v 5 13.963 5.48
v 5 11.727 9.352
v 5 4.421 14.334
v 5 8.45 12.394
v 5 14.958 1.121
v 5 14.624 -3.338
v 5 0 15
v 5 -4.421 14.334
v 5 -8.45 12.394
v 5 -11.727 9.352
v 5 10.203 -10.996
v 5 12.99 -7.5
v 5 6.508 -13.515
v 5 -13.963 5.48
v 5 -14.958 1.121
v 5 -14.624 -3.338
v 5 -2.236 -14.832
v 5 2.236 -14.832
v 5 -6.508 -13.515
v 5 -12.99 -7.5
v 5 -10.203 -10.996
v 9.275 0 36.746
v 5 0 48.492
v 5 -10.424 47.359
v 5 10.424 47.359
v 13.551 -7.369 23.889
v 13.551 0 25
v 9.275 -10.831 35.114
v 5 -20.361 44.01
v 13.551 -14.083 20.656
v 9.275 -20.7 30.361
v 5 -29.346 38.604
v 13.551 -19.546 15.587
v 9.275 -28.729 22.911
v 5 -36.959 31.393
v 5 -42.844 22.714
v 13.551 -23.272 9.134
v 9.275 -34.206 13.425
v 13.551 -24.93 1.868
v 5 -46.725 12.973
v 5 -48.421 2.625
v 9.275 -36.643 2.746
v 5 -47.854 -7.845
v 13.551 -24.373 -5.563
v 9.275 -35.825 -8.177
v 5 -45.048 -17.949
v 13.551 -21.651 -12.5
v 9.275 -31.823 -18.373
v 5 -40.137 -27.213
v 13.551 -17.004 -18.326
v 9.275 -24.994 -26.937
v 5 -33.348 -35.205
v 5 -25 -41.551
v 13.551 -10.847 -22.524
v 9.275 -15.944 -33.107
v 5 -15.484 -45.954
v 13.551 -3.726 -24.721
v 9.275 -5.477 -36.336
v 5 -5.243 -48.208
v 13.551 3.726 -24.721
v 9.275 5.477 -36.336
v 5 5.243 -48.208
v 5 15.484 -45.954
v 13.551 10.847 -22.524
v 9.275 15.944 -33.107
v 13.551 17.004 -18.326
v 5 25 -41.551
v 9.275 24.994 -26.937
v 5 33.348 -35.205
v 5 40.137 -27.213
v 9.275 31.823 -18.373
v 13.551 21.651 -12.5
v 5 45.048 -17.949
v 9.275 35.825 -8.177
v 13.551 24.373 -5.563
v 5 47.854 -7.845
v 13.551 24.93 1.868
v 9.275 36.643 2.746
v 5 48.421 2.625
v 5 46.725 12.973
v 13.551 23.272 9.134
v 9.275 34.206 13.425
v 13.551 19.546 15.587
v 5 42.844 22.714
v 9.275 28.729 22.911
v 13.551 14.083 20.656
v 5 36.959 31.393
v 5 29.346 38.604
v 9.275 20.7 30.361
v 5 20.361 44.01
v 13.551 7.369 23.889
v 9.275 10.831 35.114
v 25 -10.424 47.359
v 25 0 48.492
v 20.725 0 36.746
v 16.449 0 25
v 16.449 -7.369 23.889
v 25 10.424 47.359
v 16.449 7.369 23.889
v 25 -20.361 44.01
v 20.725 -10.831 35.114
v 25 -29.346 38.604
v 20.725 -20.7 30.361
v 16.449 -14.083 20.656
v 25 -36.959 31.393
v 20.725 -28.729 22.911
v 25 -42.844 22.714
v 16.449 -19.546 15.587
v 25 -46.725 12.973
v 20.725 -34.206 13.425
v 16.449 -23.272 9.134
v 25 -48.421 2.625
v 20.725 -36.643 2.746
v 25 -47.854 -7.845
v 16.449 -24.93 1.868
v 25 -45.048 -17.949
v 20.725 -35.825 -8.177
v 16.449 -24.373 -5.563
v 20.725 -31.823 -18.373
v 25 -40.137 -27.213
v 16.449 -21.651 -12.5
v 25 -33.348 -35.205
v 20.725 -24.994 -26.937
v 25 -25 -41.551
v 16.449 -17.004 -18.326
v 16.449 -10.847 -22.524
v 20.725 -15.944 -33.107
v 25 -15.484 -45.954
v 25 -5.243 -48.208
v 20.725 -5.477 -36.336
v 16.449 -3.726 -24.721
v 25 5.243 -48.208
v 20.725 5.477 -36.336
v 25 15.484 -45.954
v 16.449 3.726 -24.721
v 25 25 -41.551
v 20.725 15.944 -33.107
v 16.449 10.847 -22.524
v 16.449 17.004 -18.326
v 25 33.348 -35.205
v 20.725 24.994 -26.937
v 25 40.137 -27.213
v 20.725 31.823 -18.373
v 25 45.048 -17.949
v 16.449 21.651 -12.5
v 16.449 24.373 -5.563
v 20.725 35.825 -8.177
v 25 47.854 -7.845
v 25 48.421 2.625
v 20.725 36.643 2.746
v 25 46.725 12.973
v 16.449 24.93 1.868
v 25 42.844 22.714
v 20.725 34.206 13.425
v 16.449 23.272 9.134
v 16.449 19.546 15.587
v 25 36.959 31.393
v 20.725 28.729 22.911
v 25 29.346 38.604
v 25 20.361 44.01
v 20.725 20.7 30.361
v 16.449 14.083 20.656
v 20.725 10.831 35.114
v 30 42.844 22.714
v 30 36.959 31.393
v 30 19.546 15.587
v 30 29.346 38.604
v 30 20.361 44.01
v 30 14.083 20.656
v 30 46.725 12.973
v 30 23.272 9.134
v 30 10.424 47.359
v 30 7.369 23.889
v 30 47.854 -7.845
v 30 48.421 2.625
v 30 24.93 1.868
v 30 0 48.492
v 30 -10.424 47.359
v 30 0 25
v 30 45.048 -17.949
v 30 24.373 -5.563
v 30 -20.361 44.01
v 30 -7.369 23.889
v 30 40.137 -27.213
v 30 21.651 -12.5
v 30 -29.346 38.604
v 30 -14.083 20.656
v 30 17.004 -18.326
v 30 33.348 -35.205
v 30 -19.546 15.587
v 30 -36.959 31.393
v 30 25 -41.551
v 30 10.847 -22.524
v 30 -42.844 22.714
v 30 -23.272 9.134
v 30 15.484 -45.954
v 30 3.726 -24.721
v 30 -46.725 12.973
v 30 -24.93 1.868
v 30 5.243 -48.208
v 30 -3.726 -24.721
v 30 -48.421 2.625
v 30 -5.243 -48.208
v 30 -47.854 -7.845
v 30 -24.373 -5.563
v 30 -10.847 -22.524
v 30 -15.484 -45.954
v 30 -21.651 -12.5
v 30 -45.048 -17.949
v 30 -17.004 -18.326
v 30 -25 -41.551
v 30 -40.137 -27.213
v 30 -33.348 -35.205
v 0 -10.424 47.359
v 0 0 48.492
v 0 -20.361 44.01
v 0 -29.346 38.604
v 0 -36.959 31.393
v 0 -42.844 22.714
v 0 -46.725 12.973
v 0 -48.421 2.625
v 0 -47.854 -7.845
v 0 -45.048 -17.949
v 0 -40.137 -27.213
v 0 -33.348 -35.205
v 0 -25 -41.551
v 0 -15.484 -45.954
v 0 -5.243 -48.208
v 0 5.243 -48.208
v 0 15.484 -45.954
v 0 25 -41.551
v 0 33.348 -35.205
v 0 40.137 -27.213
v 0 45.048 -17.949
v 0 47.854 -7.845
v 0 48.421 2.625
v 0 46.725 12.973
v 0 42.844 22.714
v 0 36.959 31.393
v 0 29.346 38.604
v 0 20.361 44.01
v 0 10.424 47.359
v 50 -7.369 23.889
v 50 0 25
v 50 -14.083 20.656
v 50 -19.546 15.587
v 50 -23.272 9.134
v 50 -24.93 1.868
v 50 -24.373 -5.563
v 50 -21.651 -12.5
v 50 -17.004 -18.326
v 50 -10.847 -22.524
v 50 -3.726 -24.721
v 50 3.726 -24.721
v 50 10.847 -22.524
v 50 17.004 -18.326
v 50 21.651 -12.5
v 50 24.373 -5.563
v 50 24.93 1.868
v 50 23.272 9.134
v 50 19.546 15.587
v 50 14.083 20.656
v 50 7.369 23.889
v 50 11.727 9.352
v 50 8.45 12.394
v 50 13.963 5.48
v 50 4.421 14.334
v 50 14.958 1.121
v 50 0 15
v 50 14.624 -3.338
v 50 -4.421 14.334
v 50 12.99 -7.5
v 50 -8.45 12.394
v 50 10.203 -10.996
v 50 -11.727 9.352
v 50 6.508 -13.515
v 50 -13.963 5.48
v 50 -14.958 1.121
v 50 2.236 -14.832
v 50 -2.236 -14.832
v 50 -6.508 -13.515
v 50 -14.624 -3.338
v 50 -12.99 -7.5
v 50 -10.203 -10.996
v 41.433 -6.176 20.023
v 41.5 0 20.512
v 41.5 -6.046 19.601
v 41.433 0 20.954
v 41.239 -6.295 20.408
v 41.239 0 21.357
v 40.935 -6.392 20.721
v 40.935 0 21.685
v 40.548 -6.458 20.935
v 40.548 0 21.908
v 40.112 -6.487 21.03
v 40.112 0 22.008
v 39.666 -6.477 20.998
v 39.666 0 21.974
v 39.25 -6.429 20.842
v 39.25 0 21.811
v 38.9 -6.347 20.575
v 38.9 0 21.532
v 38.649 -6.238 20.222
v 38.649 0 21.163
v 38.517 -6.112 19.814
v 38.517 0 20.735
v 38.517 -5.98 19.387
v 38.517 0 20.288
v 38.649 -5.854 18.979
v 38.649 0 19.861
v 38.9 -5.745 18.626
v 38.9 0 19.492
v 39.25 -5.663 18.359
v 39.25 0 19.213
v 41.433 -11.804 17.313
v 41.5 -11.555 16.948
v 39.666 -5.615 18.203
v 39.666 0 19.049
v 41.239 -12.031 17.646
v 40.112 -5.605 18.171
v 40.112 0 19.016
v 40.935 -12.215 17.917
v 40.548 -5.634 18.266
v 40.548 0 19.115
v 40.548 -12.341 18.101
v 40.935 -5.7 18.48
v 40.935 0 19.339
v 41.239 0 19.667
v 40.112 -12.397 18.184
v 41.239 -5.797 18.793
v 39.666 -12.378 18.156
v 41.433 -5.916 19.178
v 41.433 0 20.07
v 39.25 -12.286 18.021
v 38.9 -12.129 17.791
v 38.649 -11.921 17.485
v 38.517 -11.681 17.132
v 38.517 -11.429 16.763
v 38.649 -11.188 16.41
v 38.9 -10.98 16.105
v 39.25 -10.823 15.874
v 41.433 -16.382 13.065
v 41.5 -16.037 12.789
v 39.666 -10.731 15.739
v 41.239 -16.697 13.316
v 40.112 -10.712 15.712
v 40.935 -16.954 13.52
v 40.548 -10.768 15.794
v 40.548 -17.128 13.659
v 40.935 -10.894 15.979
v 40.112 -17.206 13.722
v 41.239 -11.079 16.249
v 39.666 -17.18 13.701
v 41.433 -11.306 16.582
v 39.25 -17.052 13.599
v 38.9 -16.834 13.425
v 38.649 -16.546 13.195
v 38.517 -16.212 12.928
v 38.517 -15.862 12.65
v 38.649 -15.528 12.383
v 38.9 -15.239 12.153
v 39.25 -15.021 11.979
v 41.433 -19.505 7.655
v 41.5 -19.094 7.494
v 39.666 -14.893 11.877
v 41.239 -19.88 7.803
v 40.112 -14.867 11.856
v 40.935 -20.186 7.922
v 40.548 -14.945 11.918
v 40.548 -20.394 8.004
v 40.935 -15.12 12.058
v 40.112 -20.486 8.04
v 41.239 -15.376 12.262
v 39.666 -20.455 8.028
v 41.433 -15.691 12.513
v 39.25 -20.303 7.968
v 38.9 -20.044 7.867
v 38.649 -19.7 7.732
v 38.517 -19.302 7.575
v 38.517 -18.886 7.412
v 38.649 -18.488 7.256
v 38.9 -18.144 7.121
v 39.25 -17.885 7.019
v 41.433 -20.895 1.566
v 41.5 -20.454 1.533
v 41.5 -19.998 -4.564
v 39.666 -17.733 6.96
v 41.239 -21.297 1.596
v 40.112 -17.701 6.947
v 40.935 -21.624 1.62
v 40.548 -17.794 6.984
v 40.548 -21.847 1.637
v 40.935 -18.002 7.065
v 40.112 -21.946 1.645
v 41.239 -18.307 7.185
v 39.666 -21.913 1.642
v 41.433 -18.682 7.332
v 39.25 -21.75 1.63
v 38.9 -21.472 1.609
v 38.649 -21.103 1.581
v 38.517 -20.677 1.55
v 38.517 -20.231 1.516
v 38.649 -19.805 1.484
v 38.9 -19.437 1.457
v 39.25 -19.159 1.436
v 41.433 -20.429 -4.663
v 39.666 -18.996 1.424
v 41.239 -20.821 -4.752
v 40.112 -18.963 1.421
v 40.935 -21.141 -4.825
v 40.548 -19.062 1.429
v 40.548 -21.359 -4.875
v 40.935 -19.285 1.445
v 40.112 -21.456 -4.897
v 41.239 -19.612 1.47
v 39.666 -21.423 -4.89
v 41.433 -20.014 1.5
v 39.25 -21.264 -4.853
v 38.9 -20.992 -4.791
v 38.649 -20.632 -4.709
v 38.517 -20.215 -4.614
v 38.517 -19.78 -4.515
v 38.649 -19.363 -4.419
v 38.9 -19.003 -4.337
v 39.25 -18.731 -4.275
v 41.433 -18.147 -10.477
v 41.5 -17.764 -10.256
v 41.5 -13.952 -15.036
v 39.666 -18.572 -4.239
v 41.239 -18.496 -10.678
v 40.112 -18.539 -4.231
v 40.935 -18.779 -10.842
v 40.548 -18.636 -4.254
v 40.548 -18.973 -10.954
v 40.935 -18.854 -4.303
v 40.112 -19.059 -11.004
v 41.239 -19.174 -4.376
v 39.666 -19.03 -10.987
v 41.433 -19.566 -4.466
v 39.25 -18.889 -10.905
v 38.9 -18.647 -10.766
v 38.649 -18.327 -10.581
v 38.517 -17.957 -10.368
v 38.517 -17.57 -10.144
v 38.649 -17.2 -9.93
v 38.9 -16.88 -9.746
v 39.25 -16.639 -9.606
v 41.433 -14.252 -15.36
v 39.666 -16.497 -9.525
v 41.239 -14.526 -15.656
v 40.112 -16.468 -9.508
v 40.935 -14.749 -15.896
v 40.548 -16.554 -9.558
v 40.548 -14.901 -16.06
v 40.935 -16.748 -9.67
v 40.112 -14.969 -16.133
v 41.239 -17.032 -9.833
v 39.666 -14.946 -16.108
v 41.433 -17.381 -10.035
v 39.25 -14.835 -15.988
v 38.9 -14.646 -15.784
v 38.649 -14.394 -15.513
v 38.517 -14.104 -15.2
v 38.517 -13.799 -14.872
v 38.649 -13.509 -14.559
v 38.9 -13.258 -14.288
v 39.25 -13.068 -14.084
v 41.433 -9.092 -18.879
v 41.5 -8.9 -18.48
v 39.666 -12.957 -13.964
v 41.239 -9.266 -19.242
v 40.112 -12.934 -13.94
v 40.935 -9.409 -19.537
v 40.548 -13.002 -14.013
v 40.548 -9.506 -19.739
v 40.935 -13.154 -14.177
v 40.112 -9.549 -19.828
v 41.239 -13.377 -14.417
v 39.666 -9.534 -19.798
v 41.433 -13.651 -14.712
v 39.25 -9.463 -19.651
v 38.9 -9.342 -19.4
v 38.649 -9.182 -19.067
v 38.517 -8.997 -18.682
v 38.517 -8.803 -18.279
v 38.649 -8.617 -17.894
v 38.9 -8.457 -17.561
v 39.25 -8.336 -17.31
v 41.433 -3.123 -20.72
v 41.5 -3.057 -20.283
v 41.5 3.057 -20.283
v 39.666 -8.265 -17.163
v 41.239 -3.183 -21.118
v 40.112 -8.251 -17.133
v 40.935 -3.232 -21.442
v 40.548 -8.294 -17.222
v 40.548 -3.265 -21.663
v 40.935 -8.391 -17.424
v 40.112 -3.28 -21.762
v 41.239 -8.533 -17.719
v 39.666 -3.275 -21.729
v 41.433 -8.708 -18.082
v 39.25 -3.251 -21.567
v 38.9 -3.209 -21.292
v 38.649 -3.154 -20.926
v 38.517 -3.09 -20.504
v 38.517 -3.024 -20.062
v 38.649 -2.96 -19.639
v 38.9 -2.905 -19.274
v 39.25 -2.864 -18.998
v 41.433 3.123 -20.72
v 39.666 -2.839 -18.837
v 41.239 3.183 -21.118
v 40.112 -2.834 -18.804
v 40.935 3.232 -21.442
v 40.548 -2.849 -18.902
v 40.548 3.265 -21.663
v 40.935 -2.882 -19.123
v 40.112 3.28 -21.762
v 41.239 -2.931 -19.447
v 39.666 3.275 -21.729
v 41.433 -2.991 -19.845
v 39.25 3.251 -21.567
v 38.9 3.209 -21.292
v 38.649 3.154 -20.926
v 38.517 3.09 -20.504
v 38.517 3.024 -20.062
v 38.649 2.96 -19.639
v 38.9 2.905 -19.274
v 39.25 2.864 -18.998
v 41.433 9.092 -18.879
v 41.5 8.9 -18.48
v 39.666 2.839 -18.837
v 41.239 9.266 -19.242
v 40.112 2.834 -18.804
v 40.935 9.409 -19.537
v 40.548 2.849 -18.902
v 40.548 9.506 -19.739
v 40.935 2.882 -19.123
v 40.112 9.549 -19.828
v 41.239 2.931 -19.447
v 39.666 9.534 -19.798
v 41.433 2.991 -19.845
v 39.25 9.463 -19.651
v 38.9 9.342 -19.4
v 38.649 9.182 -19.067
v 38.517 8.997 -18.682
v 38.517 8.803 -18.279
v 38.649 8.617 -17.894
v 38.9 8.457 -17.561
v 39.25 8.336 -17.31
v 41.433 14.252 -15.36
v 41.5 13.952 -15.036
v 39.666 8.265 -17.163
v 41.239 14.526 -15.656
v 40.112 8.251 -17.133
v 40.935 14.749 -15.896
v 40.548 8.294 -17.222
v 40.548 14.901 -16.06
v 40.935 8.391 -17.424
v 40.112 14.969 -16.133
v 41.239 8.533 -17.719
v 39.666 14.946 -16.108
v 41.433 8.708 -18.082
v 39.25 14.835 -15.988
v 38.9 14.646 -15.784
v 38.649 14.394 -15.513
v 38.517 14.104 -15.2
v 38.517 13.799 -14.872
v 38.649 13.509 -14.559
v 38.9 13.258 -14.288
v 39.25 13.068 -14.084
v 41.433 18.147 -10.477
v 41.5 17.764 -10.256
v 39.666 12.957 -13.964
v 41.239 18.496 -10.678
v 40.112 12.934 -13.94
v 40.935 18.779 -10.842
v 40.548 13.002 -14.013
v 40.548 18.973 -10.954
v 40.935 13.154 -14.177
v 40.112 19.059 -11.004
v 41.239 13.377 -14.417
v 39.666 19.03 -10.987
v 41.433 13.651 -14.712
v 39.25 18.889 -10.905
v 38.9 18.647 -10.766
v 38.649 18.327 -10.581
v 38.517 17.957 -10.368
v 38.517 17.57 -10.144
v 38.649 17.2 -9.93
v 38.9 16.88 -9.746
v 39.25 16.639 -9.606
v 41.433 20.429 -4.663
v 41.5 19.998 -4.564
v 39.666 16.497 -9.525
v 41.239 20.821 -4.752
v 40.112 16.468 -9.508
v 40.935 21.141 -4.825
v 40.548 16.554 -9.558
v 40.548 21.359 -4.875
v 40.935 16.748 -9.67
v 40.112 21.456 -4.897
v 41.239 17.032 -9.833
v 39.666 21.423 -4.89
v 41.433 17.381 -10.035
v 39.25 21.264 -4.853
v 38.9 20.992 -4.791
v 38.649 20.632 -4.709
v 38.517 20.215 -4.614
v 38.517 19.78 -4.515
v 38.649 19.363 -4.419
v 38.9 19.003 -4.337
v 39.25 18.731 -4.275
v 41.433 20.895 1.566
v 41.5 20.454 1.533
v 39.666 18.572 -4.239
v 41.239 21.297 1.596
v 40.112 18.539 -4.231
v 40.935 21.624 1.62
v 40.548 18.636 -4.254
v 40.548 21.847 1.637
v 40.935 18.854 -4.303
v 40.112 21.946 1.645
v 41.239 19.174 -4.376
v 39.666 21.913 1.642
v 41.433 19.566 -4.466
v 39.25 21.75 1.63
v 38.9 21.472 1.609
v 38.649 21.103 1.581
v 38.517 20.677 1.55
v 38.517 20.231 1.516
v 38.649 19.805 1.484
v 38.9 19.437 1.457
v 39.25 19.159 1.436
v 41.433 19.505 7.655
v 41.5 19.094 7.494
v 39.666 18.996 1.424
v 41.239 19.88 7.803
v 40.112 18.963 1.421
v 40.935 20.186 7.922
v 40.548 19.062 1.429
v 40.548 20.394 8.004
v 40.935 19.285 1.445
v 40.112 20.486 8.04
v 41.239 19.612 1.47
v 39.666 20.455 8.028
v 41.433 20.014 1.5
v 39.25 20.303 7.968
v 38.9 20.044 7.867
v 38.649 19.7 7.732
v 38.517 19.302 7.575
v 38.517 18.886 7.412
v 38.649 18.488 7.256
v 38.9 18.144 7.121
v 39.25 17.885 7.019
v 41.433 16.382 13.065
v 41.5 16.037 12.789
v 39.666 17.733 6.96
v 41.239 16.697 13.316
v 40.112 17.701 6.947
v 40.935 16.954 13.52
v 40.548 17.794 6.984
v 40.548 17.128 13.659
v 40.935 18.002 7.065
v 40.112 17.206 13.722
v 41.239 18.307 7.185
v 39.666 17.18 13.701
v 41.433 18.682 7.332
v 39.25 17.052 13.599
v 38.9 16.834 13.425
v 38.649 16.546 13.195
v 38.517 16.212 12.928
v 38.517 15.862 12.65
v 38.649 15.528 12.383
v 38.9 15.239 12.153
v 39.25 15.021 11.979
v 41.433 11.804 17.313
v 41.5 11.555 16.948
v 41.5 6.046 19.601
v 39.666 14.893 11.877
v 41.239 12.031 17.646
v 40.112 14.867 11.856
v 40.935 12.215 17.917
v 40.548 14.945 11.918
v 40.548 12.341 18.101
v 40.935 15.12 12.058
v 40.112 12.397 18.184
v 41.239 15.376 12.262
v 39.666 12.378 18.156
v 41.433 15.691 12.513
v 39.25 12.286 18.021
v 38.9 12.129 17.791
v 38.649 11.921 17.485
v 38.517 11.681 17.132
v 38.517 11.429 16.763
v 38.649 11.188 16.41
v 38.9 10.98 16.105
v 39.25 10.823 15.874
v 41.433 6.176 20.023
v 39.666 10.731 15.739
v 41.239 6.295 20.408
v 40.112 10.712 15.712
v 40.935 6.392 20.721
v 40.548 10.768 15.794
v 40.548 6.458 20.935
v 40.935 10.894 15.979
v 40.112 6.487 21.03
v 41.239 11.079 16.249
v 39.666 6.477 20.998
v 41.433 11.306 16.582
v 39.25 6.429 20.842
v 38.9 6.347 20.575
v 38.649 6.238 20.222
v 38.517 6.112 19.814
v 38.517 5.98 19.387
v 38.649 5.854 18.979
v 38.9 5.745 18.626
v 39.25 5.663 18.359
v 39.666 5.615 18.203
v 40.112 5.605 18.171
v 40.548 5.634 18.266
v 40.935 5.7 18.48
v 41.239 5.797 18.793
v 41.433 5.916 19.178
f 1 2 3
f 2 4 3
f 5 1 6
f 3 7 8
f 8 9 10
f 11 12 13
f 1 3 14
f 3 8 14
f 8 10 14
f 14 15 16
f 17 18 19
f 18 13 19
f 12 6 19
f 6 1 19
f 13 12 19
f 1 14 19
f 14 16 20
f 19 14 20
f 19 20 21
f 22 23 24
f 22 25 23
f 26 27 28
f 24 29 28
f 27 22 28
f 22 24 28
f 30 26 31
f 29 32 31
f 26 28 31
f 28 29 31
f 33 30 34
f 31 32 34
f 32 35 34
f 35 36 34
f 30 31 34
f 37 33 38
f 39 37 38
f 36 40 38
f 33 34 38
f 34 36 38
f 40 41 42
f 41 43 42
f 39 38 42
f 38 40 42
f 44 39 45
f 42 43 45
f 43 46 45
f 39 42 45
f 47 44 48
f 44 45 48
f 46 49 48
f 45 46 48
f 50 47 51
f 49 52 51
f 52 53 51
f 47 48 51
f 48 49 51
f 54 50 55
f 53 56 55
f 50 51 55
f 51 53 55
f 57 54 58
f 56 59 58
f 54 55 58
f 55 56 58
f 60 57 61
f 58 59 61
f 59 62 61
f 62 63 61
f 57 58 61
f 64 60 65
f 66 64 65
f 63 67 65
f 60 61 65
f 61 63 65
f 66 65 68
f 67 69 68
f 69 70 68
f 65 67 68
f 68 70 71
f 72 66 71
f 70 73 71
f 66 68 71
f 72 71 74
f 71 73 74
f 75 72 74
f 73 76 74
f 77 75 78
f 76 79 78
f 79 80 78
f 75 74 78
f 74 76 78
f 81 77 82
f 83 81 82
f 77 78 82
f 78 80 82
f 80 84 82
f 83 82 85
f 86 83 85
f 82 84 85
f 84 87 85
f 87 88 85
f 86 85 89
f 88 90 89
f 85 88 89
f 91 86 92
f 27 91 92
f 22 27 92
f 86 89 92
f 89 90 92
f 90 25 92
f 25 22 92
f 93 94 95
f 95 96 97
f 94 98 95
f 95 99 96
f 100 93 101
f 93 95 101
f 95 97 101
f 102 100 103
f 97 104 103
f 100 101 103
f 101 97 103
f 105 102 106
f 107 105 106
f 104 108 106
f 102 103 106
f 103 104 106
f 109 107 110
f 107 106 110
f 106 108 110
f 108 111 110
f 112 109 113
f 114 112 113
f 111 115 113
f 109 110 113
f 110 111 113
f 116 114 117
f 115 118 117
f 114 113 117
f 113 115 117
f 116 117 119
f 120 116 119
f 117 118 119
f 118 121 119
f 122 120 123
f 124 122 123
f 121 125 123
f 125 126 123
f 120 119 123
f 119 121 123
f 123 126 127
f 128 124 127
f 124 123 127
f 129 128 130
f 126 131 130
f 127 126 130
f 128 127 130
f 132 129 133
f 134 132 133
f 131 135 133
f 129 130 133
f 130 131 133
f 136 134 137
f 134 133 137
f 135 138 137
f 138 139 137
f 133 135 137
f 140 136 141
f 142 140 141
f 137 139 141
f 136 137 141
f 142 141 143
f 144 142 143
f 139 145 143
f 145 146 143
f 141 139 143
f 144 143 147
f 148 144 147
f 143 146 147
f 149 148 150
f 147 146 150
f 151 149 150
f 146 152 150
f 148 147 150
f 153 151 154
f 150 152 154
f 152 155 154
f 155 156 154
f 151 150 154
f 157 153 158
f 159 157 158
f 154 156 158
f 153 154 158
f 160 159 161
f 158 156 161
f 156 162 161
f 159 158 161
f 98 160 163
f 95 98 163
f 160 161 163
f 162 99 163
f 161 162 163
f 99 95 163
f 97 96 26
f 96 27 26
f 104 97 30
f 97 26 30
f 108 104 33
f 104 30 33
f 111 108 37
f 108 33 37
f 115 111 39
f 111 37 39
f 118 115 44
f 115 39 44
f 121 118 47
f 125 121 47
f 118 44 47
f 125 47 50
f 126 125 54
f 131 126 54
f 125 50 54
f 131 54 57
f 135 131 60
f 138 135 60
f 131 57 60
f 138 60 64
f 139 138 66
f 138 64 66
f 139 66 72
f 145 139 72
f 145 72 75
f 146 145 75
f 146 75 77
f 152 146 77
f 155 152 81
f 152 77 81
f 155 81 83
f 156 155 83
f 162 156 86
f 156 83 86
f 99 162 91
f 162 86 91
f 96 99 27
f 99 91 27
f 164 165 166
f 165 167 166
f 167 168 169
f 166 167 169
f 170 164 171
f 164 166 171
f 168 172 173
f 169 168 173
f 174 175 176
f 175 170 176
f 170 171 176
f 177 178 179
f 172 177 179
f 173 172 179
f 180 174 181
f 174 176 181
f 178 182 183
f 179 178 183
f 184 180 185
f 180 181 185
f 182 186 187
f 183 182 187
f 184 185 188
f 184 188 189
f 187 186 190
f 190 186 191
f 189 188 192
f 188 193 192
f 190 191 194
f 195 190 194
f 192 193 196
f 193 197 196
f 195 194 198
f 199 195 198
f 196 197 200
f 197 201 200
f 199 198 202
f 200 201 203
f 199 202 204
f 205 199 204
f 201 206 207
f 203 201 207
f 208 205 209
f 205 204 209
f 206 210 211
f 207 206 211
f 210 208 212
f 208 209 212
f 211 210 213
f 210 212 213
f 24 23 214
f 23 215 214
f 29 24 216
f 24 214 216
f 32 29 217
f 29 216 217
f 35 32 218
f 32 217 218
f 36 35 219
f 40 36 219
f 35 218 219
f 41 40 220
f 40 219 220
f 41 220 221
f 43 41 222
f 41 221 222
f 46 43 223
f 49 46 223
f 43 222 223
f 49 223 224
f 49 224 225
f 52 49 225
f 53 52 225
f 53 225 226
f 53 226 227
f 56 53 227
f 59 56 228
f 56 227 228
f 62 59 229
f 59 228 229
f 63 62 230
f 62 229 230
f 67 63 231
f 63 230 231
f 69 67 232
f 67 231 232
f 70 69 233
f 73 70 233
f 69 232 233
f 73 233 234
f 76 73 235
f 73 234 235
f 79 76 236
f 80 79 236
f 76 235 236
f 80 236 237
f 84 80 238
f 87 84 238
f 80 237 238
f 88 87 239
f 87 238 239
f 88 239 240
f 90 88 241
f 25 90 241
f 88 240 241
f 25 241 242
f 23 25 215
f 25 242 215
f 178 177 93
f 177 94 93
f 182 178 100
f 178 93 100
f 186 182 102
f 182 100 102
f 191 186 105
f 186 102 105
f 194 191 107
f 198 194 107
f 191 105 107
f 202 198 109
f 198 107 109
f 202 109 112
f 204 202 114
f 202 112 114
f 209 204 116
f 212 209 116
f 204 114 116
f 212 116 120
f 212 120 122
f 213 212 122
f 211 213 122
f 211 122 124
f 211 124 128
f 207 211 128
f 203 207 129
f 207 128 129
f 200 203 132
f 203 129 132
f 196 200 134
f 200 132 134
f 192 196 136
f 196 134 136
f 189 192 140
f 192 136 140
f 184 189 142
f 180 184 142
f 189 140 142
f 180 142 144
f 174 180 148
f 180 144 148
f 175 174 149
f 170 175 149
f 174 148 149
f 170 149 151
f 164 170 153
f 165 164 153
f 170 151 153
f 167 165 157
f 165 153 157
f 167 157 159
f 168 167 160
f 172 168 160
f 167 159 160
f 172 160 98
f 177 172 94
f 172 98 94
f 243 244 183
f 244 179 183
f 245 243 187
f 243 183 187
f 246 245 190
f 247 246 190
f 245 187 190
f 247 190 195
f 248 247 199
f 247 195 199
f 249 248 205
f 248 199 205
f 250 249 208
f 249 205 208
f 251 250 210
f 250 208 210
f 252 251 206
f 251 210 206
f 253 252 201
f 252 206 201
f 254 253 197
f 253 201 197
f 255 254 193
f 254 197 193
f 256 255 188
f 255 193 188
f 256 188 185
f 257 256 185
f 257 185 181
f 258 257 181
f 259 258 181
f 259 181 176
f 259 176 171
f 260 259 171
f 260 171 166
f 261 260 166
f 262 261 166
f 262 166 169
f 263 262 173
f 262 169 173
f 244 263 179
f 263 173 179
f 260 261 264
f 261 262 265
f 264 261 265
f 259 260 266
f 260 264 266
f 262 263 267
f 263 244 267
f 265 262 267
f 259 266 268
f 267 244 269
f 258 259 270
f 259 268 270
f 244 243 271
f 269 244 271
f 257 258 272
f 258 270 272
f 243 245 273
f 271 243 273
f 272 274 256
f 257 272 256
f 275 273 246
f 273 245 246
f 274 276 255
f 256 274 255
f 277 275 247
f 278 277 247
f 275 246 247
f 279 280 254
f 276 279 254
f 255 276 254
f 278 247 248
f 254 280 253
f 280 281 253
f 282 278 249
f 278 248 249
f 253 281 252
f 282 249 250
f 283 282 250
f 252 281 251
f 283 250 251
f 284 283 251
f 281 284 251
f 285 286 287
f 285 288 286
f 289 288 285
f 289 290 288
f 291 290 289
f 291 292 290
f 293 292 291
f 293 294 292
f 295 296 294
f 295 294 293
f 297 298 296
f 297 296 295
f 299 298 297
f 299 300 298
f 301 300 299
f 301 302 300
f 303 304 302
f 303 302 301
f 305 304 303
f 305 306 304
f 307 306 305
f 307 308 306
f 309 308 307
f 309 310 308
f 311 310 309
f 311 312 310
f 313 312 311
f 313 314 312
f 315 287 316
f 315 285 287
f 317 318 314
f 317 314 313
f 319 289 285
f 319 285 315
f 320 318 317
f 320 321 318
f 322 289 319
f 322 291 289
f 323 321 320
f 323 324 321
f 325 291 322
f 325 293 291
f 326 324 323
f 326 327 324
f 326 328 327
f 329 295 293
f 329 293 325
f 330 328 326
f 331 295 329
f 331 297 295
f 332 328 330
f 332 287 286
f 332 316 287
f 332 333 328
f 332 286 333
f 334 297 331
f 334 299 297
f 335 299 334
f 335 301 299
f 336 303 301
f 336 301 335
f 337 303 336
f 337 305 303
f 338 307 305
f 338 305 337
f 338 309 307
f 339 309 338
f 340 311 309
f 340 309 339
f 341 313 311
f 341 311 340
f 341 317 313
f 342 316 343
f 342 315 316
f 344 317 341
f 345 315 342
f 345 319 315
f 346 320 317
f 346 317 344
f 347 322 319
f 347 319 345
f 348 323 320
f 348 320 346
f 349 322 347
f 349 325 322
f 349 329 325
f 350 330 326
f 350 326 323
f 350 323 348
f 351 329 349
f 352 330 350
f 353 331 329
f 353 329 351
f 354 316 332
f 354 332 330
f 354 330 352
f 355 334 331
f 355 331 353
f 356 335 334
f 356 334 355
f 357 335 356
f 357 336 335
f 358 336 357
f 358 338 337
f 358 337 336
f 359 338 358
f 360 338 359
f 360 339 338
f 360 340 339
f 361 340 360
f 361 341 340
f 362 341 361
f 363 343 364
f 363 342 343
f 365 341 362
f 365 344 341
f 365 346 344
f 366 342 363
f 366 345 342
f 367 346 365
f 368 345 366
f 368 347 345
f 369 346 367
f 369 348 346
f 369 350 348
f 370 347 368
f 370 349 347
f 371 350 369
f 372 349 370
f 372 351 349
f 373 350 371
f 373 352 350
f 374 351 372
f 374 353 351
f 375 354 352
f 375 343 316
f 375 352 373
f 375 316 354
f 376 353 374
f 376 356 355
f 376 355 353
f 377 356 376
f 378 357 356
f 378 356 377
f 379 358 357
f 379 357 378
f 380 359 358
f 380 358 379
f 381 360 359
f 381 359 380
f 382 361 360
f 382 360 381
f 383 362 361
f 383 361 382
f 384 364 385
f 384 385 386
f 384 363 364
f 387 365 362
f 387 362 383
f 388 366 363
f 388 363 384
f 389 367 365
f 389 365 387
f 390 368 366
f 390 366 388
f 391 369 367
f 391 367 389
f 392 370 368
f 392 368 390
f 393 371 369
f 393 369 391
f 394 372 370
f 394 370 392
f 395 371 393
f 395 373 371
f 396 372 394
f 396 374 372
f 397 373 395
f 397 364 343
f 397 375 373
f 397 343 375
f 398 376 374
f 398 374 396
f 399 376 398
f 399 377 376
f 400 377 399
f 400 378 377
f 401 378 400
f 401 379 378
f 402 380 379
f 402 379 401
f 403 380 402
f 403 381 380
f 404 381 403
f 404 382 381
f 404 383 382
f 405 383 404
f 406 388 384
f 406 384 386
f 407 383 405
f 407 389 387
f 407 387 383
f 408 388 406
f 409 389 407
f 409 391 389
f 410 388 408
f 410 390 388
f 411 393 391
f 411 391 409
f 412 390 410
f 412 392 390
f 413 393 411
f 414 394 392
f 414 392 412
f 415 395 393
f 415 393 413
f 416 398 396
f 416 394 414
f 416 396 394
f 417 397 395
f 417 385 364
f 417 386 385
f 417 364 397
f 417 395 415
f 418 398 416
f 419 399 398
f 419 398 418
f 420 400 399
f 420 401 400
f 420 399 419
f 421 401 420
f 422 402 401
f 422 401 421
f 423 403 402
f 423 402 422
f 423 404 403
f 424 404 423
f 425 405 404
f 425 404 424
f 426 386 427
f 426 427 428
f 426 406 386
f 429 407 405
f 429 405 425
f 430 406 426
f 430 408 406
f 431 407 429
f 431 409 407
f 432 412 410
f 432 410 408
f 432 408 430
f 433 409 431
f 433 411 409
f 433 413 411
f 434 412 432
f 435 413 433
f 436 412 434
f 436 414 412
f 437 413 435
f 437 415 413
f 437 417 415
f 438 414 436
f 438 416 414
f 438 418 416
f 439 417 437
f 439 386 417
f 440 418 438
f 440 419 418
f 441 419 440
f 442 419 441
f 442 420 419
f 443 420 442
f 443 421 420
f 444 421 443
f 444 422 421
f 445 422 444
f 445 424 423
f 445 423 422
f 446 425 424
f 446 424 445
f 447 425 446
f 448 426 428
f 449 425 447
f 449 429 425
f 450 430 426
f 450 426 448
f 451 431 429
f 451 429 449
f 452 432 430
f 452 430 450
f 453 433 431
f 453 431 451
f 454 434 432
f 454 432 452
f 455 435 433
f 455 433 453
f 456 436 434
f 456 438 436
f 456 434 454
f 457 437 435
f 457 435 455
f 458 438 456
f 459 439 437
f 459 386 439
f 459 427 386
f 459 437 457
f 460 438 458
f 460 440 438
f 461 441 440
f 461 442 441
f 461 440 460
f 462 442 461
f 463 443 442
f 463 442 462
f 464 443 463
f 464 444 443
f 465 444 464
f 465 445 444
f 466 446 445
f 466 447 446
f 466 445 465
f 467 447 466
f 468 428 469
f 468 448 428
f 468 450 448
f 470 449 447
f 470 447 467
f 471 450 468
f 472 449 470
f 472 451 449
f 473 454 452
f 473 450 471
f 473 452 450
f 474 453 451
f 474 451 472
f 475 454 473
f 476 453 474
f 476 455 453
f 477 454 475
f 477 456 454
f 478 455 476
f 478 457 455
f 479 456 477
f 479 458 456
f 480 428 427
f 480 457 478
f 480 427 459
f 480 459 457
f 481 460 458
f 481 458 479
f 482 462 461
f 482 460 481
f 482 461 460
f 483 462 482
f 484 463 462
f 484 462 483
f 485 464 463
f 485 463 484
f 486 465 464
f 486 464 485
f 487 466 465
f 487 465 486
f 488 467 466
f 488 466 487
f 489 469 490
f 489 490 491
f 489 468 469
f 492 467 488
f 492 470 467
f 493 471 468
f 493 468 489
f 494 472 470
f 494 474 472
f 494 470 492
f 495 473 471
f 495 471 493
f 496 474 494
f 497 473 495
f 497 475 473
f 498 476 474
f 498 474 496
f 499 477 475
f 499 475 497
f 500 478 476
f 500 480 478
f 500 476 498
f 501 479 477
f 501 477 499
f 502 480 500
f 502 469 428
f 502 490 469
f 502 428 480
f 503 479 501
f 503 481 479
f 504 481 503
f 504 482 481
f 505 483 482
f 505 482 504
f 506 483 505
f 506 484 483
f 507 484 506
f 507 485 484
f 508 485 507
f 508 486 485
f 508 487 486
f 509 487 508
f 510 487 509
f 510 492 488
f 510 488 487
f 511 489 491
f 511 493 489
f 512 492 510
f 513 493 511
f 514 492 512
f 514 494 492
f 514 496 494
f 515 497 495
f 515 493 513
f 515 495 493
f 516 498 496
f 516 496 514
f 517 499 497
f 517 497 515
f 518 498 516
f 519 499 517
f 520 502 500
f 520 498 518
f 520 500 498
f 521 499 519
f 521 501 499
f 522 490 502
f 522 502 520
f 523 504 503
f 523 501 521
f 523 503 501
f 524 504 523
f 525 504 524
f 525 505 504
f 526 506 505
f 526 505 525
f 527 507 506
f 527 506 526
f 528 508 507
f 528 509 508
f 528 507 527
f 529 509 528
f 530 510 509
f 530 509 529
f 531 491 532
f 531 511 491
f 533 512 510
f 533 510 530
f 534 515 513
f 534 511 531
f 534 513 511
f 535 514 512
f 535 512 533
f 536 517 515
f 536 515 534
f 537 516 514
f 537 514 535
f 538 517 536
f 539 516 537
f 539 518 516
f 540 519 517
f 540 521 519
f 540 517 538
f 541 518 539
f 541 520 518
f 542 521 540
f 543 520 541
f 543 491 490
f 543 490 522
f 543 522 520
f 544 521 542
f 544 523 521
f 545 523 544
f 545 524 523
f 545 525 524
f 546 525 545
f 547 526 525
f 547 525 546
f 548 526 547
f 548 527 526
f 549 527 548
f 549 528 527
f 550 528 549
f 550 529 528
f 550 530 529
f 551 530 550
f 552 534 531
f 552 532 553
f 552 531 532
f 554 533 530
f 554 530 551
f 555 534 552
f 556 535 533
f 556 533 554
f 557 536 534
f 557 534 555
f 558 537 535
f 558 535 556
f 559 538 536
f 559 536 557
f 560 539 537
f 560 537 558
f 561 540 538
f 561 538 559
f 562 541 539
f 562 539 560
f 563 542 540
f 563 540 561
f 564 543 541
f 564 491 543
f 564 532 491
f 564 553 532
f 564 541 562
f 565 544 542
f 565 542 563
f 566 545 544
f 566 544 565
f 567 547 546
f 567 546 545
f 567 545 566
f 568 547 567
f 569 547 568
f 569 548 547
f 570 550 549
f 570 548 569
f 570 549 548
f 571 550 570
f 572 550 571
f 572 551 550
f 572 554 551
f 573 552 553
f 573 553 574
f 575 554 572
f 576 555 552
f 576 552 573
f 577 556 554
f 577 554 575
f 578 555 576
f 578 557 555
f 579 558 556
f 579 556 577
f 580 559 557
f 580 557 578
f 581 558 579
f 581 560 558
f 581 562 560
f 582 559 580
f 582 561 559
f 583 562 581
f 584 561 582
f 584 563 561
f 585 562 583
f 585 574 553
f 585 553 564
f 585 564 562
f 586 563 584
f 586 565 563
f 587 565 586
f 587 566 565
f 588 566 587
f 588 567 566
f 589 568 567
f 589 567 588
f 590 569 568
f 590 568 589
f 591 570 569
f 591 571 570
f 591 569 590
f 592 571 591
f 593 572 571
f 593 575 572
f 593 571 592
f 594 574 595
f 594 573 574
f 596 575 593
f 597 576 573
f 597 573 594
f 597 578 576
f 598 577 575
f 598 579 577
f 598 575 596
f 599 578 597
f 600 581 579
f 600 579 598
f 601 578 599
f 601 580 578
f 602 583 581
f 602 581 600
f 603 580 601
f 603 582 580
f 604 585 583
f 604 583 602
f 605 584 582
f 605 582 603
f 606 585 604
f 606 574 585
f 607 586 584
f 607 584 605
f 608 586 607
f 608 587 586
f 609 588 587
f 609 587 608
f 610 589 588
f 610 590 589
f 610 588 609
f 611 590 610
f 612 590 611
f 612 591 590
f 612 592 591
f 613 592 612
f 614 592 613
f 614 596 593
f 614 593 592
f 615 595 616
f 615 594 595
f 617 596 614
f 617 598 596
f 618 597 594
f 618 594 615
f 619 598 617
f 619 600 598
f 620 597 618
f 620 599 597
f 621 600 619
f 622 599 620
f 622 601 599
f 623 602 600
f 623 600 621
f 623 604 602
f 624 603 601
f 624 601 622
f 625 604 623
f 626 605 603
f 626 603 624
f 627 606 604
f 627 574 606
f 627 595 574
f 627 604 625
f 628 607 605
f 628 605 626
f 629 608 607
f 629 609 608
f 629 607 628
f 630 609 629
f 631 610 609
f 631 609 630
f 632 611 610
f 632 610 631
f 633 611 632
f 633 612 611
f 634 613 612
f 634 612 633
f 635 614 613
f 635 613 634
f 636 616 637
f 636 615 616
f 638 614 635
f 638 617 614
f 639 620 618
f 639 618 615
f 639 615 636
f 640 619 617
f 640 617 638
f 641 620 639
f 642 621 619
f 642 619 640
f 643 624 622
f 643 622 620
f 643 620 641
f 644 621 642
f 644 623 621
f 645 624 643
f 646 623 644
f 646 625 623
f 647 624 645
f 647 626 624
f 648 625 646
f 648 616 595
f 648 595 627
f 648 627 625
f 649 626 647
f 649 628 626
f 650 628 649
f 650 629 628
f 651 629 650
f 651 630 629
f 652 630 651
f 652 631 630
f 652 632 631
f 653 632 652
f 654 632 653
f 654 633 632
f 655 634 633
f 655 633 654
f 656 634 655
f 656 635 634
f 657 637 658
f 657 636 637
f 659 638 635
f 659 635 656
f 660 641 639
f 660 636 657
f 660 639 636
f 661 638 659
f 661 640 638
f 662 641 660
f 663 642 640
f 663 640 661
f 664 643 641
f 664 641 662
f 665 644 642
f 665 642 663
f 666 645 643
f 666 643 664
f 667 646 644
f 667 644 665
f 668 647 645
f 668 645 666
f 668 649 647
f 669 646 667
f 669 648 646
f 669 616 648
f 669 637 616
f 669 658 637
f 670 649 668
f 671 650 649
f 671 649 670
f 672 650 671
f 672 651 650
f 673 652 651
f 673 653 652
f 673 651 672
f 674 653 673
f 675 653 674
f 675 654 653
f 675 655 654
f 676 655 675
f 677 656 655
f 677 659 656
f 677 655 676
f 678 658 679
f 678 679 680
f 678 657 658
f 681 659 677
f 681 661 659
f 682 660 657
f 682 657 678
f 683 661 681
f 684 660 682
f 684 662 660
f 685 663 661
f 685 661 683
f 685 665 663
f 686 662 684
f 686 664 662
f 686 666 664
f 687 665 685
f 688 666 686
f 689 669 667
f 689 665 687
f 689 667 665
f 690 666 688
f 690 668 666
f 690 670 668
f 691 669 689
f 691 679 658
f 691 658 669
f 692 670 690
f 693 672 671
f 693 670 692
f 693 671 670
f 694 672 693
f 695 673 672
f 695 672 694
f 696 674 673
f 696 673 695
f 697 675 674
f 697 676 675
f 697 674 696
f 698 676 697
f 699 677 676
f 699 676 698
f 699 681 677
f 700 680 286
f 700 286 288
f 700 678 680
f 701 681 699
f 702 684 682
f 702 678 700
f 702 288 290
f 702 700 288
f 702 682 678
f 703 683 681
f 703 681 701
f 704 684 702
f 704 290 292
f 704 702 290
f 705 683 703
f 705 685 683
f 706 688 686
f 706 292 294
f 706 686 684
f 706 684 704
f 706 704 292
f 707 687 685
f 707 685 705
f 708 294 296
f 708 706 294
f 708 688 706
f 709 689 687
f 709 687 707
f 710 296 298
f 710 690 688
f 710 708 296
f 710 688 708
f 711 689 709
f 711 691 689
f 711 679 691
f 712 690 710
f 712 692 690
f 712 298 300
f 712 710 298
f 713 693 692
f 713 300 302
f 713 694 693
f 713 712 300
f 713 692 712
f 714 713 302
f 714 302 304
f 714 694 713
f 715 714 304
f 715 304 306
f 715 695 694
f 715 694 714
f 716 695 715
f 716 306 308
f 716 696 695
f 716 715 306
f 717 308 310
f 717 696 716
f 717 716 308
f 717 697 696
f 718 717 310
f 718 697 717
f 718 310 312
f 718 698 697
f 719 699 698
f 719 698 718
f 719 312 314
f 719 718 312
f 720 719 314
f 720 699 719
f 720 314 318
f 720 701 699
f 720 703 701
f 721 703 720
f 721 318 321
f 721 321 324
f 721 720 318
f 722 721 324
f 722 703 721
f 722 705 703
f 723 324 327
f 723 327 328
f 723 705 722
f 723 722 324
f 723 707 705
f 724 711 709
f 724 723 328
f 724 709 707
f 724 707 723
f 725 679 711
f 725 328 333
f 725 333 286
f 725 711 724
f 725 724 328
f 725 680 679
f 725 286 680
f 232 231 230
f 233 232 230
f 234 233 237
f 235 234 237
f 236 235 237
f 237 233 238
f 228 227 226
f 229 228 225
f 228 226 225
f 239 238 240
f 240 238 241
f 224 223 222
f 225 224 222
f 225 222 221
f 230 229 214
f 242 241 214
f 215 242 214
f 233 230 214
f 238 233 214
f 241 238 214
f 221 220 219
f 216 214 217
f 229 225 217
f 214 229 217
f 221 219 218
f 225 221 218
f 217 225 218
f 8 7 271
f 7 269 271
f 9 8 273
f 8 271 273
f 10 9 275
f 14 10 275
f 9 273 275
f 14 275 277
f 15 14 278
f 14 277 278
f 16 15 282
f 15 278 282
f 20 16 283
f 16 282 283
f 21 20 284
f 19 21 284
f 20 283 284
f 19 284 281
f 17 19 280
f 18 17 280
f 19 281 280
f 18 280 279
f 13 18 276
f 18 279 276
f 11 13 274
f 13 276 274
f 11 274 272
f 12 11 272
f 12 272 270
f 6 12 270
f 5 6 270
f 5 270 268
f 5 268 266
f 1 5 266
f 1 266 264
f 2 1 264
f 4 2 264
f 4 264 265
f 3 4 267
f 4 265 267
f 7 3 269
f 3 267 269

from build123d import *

# Parameters (mm, degrees)
SKETCH1_W = 8.257122183
SKETCH1_H = 10
SKETCH1_R = 1.5


with BuildPart() as part:
    # Sketch1 → Revolve10 (revolve)
    with BuildSketch(Plane(origin=(0, 0, 0), x_dir=(1, 0, 0), z_dir=(0, 1, 0)), mode=Mode.PRIVATE) as revolve10_sk:
        Polygon((0, 48.49231552), (0, 0), (5, 0), (5, 15), (38.242877817, 15), (38.242877817, 25), (30, 25), (30, 48.49231552), (25, 48.49231552), (16.449496417, 25), (13.550503583, 25), (5, 48.49231552), align=None)
        with Locations((45.871438908, 20)):
            Rectangle(SKETCH1_W, SKETCH1_H)
        Polygon((38.242877817, 25), (38.242877817, 15), (39.242877817, 15), (40.742877817, 15), (41.742877817, 15), (41.742877817, 25), (40.75, 25), (40.742877817, 25), (39.25, 25), (39.242877817, 25), align=None)
        with Locations((40, 20.511791121)):
            Circle(SKETCH1_R, mode=Mode.SUBTRACT)
    revolve(revolve10_sk.sketch.rotate(Axis((0, 0, 0), (1, 0, 0)), 180), axis=Axis((0, 0, 0), (1, 0, 0)))


solid = part.part
